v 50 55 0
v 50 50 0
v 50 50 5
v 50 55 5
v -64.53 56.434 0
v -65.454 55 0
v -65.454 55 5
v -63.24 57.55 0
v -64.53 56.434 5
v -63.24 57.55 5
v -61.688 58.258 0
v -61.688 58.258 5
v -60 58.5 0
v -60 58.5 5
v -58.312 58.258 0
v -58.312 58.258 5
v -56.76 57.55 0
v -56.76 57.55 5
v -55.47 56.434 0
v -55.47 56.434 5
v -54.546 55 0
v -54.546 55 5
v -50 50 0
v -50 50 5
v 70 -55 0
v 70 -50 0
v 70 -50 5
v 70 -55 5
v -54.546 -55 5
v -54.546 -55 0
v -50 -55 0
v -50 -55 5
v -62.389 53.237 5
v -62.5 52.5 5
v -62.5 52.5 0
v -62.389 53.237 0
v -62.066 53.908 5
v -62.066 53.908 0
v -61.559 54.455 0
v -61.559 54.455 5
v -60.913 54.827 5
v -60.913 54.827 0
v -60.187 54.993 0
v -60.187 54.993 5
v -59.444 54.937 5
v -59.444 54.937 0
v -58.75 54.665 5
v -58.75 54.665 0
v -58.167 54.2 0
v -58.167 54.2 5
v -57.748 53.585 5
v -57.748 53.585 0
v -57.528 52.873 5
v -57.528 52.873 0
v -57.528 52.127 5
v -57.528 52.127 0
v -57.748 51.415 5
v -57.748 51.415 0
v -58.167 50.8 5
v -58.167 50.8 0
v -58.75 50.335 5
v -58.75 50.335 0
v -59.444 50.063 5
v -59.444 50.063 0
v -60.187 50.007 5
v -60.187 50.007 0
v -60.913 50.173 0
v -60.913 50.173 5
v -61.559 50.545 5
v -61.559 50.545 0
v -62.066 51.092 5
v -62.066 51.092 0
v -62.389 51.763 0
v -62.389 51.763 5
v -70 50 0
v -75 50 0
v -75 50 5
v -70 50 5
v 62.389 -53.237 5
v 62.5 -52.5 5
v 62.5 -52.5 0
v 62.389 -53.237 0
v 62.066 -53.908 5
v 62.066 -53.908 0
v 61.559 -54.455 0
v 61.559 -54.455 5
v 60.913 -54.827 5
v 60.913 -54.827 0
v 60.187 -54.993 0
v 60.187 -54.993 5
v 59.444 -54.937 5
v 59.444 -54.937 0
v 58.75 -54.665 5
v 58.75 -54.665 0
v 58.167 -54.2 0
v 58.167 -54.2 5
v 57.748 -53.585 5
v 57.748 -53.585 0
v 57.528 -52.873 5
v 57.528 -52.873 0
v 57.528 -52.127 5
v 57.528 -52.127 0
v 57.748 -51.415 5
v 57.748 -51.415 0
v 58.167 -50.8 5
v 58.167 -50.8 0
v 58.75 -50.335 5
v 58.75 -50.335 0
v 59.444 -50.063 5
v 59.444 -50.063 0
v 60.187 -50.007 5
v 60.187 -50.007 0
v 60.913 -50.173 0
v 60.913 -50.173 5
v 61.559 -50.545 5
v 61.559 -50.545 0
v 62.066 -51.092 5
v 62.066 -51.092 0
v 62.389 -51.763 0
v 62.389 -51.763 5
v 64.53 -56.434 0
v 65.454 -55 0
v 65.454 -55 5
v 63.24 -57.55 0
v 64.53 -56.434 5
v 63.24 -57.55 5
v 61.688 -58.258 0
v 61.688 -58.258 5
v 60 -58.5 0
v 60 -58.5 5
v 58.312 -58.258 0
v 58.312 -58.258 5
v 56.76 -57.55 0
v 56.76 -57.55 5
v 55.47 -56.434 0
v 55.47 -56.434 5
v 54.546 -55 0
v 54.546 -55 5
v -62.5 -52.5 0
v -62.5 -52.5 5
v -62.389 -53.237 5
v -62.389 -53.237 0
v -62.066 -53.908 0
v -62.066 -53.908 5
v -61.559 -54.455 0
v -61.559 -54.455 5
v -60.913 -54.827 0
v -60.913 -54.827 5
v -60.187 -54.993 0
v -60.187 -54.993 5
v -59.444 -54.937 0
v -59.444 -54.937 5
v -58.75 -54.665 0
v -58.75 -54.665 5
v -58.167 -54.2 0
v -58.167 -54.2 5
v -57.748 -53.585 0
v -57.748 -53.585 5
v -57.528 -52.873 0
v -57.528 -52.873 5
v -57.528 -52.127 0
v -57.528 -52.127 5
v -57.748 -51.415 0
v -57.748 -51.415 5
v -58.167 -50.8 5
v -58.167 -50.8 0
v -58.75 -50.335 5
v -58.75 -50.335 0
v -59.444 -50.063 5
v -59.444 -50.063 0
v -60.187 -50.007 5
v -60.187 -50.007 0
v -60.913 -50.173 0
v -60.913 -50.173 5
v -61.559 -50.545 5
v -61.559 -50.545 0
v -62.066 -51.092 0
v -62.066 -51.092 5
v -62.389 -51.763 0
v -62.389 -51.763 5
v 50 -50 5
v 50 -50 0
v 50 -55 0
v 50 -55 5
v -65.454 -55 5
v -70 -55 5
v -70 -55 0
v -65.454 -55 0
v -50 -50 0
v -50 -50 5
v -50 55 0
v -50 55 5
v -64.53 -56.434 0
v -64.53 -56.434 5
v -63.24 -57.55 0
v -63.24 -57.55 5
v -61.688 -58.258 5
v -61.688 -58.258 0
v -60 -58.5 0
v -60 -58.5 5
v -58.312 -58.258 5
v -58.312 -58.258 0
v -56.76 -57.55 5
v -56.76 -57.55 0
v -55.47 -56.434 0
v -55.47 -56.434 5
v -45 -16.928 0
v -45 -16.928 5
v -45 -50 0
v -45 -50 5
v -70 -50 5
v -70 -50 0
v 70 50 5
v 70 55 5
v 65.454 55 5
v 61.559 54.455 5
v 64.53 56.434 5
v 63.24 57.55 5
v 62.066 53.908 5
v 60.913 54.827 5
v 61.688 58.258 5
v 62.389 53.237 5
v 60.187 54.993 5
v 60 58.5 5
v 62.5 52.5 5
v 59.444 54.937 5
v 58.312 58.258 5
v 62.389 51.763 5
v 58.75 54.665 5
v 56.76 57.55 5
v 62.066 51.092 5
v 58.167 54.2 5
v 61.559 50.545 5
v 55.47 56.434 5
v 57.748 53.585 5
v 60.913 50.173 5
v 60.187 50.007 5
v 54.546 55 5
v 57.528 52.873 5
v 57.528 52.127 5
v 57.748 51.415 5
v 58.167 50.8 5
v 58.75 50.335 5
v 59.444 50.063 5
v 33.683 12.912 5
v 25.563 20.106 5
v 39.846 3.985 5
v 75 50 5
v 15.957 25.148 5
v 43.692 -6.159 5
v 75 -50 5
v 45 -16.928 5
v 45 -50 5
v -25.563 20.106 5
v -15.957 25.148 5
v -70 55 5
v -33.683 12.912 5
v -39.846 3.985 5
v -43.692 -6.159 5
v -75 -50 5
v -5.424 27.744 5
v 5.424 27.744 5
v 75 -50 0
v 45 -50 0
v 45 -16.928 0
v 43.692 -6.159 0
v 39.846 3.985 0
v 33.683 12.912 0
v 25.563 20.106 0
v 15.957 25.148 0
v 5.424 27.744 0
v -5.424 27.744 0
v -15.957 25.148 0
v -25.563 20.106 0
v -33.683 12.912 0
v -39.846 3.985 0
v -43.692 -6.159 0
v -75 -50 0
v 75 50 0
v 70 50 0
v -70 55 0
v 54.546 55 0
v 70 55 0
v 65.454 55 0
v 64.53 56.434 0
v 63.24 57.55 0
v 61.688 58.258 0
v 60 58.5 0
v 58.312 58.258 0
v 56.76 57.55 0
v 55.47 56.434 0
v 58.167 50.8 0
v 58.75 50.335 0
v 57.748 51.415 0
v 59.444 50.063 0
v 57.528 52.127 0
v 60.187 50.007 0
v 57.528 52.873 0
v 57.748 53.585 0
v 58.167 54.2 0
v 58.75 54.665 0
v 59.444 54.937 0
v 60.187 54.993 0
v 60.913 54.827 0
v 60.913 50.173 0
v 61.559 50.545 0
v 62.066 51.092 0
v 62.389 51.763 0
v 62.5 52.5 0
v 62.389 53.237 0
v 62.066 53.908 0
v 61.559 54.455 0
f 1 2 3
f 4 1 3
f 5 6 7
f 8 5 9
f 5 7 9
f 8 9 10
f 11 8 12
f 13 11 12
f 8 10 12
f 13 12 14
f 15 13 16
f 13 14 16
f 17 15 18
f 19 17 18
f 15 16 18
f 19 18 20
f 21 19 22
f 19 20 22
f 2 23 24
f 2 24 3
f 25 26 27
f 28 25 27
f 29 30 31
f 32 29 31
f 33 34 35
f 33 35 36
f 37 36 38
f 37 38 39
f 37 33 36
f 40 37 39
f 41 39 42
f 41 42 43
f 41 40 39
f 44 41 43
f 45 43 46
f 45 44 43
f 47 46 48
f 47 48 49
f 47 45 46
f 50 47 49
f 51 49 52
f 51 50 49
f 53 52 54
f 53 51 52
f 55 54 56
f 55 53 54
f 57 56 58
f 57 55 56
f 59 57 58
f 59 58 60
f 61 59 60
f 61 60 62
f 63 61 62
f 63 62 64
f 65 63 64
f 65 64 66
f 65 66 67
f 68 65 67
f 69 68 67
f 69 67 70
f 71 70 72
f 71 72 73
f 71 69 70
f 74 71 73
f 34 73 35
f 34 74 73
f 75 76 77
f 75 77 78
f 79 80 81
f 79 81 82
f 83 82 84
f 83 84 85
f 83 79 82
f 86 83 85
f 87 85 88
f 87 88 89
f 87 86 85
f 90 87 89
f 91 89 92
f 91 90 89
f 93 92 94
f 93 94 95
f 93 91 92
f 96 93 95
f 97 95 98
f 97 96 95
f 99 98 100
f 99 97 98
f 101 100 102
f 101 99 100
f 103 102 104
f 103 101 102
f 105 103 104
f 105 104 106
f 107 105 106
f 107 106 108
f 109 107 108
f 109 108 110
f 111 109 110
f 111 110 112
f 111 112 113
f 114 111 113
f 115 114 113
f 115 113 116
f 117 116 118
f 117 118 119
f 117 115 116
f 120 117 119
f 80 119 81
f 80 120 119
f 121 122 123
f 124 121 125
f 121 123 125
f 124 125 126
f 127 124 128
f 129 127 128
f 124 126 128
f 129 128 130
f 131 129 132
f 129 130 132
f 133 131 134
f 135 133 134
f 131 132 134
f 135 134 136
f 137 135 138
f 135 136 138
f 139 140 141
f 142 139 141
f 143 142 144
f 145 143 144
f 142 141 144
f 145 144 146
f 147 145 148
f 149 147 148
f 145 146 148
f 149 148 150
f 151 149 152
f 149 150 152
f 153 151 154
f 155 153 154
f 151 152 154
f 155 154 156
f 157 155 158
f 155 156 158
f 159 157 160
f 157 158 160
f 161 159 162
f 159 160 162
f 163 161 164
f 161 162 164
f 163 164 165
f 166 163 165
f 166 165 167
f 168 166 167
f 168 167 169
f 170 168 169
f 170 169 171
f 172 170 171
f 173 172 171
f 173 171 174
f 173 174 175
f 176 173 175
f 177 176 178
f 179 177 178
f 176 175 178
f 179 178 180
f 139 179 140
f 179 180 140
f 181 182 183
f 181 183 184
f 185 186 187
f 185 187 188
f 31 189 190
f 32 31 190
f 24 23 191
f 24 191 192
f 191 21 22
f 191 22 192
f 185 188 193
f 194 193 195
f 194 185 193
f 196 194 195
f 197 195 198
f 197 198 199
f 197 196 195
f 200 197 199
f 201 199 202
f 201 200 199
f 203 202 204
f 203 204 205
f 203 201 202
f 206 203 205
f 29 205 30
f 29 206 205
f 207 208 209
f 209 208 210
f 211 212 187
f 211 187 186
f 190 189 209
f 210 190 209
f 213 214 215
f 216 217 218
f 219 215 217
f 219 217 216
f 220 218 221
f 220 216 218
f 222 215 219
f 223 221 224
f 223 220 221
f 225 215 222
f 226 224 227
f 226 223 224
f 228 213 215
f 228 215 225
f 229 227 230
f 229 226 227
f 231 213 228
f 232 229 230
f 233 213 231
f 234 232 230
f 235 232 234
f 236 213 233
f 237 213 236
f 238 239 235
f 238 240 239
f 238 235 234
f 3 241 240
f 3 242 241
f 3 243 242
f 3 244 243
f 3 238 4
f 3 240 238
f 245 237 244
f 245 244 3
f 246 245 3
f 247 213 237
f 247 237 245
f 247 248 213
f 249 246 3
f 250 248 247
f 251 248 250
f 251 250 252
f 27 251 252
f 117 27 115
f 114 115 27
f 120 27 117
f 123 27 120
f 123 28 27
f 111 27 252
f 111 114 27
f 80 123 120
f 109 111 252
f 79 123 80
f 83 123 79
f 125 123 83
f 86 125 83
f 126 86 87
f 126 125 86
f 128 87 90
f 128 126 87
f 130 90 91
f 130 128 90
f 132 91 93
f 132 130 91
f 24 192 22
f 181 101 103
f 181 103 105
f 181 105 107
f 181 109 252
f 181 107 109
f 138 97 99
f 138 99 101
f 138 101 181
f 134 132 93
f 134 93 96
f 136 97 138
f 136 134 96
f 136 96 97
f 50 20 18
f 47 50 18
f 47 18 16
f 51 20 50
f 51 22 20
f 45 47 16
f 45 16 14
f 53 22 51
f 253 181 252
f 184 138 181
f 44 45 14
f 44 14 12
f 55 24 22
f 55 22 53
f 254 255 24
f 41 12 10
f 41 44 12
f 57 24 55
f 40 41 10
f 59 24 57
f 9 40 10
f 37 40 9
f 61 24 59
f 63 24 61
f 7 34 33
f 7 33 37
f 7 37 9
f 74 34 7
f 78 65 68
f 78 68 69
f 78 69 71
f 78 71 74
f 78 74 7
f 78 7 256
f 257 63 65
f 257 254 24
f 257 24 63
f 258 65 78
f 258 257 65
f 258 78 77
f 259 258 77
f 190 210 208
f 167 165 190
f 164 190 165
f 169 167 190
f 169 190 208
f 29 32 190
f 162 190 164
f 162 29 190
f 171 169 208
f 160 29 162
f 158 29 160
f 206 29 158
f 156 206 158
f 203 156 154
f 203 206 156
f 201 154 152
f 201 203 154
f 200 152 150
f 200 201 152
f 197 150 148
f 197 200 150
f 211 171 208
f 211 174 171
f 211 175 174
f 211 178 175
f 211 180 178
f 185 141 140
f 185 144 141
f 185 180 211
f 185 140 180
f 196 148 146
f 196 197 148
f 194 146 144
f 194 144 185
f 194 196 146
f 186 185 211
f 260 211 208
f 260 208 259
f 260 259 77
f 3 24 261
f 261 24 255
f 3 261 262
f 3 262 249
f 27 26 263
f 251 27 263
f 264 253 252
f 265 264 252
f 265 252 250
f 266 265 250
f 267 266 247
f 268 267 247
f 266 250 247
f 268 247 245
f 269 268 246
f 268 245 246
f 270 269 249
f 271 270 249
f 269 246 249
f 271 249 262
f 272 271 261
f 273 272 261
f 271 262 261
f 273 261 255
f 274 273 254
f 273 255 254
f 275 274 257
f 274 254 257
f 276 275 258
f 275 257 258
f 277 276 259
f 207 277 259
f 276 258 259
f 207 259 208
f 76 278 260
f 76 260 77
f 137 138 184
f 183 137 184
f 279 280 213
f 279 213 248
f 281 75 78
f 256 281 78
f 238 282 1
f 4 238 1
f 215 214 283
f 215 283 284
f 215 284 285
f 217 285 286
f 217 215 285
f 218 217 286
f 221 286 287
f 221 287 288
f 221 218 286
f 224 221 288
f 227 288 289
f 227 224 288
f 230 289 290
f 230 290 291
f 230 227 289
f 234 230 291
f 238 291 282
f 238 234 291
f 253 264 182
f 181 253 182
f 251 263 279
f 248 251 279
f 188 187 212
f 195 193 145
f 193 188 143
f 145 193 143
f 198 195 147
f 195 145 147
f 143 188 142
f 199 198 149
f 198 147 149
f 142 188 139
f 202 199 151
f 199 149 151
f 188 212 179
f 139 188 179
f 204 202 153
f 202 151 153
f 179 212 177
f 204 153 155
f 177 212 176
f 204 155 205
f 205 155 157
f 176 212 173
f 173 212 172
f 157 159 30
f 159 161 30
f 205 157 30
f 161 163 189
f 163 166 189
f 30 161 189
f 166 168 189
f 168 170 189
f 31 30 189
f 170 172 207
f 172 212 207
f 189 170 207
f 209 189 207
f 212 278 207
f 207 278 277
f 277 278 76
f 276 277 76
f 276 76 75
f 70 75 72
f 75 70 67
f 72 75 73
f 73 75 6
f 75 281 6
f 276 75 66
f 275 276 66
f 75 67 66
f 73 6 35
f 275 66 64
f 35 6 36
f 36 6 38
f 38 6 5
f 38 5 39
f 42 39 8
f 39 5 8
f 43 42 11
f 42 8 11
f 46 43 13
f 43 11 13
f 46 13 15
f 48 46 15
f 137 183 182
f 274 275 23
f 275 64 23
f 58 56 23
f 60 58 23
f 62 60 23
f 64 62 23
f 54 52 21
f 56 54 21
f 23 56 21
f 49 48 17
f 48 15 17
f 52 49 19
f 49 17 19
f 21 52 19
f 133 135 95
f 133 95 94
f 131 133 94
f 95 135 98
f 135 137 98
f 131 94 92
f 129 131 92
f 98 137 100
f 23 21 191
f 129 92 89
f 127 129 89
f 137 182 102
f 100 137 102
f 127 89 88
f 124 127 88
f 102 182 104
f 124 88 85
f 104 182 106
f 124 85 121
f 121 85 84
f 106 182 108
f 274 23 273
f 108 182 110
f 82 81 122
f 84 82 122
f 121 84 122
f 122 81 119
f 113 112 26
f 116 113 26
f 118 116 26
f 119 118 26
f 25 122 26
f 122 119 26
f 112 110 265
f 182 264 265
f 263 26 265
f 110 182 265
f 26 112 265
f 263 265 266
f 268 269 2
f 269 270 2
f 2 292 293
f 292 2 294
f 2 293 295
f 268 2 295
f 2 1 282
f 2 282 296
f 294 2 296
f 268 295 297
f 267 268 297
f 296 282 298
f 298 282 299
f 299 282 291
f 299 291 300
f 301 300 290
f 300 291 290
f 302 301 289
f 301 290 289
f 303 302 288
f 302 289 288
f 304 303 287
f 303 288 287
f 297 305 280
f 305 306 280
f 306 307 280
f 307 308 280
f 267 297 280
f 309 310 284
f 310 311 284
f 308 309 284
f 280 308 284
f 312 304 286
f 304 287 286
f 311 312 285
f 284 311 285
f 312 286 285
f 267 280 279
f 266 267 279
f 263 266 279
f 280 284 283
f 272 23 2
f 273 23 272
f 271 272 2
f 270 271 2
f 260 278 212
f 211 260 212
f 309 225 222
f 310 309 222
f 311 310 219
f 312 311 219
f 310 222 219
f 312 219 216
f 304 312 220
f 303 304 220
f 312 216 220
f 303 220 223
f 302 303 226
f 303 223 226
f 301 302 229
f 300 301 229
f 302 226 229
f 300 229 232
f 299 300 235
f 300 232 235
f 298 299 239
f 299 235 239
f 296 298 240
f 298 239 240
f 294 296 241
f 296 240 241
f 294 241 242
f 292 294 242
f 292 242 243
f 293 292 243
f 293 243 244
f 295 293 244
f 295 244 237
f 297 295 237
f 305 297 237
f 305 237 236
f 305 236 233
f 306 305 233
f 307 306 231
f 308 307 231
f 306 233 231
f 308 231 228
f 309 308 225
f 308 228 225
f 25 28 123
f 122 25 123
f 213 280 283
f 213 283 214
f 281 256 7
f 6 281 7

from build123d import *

# Parameters (mm, degrees)
SKETCH1_W                                  = 150
SKETCH1_H                                  = 100
BOSS_EXTRUDE1_DEPTH                        = 5
SKETCH3_W                                  = 20
SKETCH3_H                                  = 5
BOSS_EXTRUDE2_DEPTH                        = 5
MIRROR1_AT_THE_SECOND_PLANE_COPY_1_SKETC_W = 20
MIRROR1_AT_THE_SECOND_PLANE_COPY_1_SKETC_H = 5
MIRROR1_AT_THE_SECOND_PLANE_COPY_1_DEPTH   = 5
SKETCH4_R                                  = 6
BOSS_EXTRUDE3_DEPTH                        = 5
SKETCH5_R                                  = 2.5
CUT_EXTRUDE1_DEPTH                         = 5
MIRROR2_AT_THE_SECOND_PLANE_COPY_1_SKETC_R = 6
MIRROR2_AT_THE_SECOND_PLANE_COPY_1_DEPTH   = 5
MIRROR2_AT_THE_SECOND_PLANE_COPY_2_SKETC_R = 2.5
MIRROR2_AT_THE_SECOND_PLANE_COPY_2_DEPTH   = 5
CUT_EXTRUDE3_DEPTH                         = 1
CUT_EXTRUDE3_DEPTH_BACK                    = 5


with BuildPart() as part:
    # Sketch1 → Boss-Extrude1 (new body)
    with BuildSketch(Plane.XY):
        Rectangle(SKETCH1_W, SKETCH1_H)
    extrude(amount=BOSS_EXTRUDE1_DEPTH)

    # Sketch3 → Boss-Extrude2 (add)
    with BuildSketch(Plane.XZ.offset(50)):
        with Locations((-60, 2.5)):
            Rectangle(SKETCH3_W, SKETCH3_H)
    boss_extrude2 = extrude(amount=BOSS_EXTRUDE2_DEPTH)

    # Mirror1: Boss-Extrude2 across plane
    add(boss_extrude2.mirror(Plane(origin=(0, 0, 0), x_dir=(0, 0, 1), z_dir=(1, 0, 0))))

    # Mirror1 at the second plane: Boss-Extrude2 across plane
    add(boss_extrude2.mirror(Plane.ZX))

    # Mirror1 at the second plane copy 1 sketc → Mirror1 at the second plane copy 1 (add)
    with BuildSketch(Plane(origin=(0, 50, 0), x_dir=(-1, 0, 0), z_dir=(0, 1, 0))):
        with Locations((-60, 2.5)):
            Rectangle(MIRROR1_AT_THE_SECOND_PLANE_COPY_1_SKETC_W, MIRROR1_AT_THE_SECOND_PLANE_COPY_1_SKETC_H)
    extrude(amount=MIRROR1_AT_THE_SECOND_PLANE_COPY_1_DEPTH)

    # Sketch4 → Boss-Extrude3 (add)
    with BuildSketch(Plane.XY.offset(5)):
        with Locations((60, 52.5)):
            Circle(SKETCH4_R)
    boss_extrude3 = extrude(amount=-BOSS_EXTRUDE3_DEPTH)

    # Sketch5 → Cut-Extrude1 (cut)
    with BuildSketch(Plane.XY.offset(5)):
        with Locations((60, 52.5)):
            Circle(SKETCH5_R)
    cut_extrude1 = extrude(amount=-CUT_EXTRUDE1_DEPTH, mode=Mode.SUBTRACT)

    # Mirror2: Boss-Extrude3, Cut-Extrude1 across plane
    add(boss_extrude3.mirror(Plane(origin=(0, 0, 0), x_dir=(0, 0, 1), z_dir=(1, 0, 0))))
    add(cut_extrude1.mirror(Plane(origin=(0, 0, 0), x_dir=(0, 0, 1), z_dir=(1, 0, 0))), mode=Mode.SUBTRACT)

    # Mirror2 at the second plane: Boss-Extrude3, Cut-Extrude1 across plane
    add(boss_extrude3.mirror(Plane.ZX))
    add(cut_extrude1.mirror(Plane.ZX), mode=Mode.SUBTRACT)

    # Mirror2 at the second plane copy 1 sketc → Mirror2 at the second plane copy 1 (add)
    with BuildSketch(Plane(origin=(0, 0, 5), x_dir=(-1, 0, 0), z_dir=(0, 0, 1))):
        with Locations((60, 52.5)):
            Circle(MIRROR2_AT_THE_SECOND_PLANE_COPY_1_SKETC_R)
    extrude(amount=-MIRROR2_AT_THE_SECOND_PLANE_COPY_1_DEPTH)

    # Mirror2 at the second plane copy 2 sketc → Mirror2 at the second plane copy 2 (cut)
    with BuildSketch(Plane(origin=(0, 0, 5), x_dir=(-1, 0, 0), z_dir=(0, 0, 1))):
        with Locations((60, 52.5)):
            Circle(MIRROR2_AT_THE_SECOND_PLANE_COPY_2_SKETC_R)
    extrude(amount=-MIRROR2_AT_THE_SECOND_PLANE_COPY_2_DEPTH, mode=Mode.SUBTRACT)

    # Sketch8 → Cut-Extrude3 (cut, two sides)
    with BuildSketch(Plane.XY.offset(5)) as cut_extrude3_sk:
        with BuildLine():
            Line((45, -383.556795633), (45, -50))
            Line((45, -50), (45, -16.928023383))
            ThreePointArc((45, -16.928023383), (0, 28.071976617), (-45, -16.928023383))
            Line((-45, -16.928023383), (-45, -50))
            Line((-45, -50), (-45, -383.556795633))
            Line((-45, -383.556795633), (-45, -1050.670386898))
            Line((-45, -1050.670386898), (45, -1050.670386898))
            Line((45, -1050.670386898), (45, -383.556795633))
        make_face()
    extrude(amount=CUT_EXTRUDE3_DEPTH, mode=Mode.SUBTRACT)
    extrude(cut_extrude3_sk.sketch, amount=-CUT_EXTRUDE3_DEPTH_BACK, mode=Mode.SUBTRACT)


solid = part.part
